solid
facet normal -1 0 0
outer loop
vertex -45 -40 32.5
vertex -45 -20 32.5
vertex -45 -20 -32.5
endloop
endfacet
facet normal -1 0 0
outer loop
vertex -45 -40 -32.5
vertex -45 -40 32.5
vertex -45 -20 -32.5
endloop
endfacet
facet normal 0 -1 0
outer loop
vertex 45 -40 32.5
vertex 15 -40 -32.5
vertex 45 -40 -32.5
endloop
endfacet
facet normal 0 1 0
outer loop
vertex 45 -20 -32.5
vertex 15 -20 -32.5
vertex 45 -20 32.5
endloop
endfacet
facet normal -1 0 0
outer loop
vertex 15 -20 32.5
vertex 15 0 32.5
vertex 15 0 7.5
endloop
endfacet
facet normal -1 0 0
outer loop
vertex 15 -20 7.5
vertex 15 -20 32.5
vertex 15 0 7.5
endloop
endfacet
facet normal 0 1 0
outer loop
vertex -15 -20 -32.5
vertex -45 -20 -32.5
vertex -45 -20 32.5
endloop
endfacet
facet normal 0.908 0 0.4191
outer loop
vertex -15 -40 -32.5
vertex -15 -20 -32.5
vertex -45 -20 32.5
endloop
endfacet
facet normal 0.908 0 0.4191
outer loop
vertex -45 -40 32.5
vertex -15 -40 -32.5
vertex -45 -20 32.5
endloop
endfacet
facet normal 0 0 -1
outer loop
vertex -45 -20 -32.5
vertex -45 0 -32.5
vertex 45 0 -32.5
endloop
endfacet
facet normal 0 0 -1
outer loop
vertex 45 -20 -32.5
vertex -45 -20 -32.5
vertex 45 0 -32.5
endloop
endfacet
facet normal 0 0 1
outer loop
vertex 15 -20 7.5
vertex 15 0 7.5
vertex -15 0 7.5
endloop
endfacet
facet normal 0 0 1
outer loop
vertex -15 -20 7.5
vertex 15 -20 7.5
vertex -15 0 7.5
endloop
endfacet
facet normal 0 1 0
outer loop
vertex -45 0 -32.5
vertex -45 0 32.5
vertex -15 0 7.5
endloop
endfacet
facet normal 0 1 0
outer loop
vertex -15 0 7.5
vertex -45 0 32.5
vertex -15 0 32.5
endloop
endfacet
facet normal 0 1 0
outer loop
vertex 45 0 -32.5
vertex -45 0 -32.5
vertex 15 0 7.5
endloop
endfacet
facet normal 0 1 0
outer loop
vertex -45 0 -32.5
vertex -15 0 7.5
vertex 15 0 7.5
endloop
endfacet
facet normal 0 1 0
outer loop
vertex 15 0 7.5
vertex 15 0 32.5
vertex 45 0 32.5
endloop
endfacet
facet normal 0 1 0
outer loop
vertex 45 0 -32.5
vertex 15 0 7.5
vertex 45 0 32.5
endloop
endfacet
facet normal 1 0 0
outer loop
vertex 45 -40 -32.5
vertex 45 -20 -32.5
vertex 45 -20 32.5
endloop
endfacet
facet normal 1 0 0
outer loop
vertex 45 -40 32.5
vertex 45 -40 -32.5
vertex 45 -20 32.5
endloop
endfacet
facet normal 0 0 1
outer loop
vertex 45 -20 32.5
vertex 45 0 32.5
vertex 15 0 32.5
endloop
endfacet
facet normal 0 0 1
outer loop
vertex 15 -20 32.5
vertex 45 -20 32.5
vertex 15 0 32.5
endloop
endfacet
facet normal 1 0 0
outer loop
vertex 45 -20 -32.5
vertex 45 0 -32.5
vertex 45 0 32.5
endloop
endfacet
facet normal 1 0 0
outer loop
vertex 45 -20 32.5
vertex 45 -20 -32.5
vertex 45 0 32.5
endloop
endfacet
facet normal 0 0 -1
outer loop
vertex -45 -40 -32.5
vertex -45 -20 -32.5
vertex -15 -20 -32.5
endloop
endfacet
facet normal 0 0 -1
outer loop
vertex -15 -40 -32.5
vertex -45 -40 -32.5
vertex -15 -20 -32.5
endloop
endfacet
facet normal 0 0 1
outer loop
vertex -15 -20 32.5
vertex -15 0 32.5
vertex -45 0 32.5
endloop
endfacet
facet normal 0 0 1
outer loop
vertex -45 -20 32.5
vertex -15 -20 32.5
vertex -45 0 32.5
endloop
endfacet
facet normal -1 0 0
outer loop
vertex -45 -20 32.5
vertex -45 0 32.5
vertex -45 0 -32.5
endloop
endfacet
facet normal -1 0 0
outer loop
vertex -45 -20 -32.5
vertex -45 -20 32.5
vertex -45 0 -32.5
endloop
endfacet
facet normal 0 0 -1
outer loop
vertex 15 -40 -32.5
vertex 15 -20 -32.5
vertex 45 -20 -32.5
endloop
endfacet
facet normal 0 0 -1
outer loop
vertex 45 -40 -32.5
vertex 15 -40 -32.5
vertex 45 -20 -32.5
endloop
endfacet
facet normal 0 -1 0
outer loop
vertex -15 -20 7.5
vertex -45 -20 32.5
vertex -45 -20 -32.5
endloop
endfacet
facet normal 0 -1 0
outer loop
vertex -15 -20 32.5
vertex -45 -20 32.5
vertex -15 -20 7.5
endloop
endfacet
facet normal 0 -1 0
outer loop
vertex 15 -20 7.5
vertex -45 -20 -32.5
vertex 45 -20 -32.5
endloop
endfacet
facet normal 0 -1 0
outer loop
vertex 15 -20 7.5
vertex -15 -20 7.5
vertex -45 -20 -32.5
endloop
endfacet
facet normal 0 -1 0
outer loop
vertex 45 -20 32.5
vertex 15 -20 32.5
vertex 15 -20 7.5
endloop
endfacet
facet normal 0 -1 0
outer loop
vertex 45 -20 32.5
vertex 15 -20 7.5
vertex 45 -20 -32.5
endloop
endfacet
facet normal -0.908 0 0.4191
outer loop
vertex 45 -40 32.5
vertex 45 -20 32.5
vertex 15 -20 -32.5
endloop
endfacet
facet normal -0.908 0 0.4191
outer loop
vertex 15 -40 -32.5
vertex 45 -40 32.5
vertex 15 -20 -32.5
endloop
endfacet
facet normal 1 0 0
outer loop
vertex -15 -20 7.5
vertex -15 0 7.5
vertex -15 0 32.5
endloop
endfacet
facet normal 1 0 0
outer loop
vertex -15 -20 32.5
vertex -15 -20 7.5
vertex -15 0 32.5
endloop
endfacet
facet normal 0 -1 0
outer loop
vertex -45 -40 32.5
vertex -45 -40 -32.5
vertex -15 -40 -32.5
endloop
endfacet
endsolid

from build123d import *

# Parameters (mm, degrees)
F1_DEPTH = 20
F3_DEPTH = 20


with BuildPart() as f1:
    # F0 (on Front) → F1 (new body)
    with BuildSketch(Plane.XZ):
        Polygon((45, 7.5), (45, 32.5), (15, 32.5), (15, 7.5), (-15, 7.5), (-15, 32.5), (-45, 32.5), (-45, 7.5), (-45, -32.5), (45, -32.5), align=None)
    extrude(amount=F1_DEPTH)


with BuildPart() as f3:
    # F2 (on face) → F3 (new body)
    with BuildSketch(Plane.XZ.offset(20)):
        Polygon((-15, -32.5), (-45, 32.5), (-45, -32.5), align=None)
        Polygon((45, 32.5), (15, -32.5), (45, -32.5), align=None)
    extrude(amount=F3_DEPTH)


solid = Compound([f1.part, f3.part])
